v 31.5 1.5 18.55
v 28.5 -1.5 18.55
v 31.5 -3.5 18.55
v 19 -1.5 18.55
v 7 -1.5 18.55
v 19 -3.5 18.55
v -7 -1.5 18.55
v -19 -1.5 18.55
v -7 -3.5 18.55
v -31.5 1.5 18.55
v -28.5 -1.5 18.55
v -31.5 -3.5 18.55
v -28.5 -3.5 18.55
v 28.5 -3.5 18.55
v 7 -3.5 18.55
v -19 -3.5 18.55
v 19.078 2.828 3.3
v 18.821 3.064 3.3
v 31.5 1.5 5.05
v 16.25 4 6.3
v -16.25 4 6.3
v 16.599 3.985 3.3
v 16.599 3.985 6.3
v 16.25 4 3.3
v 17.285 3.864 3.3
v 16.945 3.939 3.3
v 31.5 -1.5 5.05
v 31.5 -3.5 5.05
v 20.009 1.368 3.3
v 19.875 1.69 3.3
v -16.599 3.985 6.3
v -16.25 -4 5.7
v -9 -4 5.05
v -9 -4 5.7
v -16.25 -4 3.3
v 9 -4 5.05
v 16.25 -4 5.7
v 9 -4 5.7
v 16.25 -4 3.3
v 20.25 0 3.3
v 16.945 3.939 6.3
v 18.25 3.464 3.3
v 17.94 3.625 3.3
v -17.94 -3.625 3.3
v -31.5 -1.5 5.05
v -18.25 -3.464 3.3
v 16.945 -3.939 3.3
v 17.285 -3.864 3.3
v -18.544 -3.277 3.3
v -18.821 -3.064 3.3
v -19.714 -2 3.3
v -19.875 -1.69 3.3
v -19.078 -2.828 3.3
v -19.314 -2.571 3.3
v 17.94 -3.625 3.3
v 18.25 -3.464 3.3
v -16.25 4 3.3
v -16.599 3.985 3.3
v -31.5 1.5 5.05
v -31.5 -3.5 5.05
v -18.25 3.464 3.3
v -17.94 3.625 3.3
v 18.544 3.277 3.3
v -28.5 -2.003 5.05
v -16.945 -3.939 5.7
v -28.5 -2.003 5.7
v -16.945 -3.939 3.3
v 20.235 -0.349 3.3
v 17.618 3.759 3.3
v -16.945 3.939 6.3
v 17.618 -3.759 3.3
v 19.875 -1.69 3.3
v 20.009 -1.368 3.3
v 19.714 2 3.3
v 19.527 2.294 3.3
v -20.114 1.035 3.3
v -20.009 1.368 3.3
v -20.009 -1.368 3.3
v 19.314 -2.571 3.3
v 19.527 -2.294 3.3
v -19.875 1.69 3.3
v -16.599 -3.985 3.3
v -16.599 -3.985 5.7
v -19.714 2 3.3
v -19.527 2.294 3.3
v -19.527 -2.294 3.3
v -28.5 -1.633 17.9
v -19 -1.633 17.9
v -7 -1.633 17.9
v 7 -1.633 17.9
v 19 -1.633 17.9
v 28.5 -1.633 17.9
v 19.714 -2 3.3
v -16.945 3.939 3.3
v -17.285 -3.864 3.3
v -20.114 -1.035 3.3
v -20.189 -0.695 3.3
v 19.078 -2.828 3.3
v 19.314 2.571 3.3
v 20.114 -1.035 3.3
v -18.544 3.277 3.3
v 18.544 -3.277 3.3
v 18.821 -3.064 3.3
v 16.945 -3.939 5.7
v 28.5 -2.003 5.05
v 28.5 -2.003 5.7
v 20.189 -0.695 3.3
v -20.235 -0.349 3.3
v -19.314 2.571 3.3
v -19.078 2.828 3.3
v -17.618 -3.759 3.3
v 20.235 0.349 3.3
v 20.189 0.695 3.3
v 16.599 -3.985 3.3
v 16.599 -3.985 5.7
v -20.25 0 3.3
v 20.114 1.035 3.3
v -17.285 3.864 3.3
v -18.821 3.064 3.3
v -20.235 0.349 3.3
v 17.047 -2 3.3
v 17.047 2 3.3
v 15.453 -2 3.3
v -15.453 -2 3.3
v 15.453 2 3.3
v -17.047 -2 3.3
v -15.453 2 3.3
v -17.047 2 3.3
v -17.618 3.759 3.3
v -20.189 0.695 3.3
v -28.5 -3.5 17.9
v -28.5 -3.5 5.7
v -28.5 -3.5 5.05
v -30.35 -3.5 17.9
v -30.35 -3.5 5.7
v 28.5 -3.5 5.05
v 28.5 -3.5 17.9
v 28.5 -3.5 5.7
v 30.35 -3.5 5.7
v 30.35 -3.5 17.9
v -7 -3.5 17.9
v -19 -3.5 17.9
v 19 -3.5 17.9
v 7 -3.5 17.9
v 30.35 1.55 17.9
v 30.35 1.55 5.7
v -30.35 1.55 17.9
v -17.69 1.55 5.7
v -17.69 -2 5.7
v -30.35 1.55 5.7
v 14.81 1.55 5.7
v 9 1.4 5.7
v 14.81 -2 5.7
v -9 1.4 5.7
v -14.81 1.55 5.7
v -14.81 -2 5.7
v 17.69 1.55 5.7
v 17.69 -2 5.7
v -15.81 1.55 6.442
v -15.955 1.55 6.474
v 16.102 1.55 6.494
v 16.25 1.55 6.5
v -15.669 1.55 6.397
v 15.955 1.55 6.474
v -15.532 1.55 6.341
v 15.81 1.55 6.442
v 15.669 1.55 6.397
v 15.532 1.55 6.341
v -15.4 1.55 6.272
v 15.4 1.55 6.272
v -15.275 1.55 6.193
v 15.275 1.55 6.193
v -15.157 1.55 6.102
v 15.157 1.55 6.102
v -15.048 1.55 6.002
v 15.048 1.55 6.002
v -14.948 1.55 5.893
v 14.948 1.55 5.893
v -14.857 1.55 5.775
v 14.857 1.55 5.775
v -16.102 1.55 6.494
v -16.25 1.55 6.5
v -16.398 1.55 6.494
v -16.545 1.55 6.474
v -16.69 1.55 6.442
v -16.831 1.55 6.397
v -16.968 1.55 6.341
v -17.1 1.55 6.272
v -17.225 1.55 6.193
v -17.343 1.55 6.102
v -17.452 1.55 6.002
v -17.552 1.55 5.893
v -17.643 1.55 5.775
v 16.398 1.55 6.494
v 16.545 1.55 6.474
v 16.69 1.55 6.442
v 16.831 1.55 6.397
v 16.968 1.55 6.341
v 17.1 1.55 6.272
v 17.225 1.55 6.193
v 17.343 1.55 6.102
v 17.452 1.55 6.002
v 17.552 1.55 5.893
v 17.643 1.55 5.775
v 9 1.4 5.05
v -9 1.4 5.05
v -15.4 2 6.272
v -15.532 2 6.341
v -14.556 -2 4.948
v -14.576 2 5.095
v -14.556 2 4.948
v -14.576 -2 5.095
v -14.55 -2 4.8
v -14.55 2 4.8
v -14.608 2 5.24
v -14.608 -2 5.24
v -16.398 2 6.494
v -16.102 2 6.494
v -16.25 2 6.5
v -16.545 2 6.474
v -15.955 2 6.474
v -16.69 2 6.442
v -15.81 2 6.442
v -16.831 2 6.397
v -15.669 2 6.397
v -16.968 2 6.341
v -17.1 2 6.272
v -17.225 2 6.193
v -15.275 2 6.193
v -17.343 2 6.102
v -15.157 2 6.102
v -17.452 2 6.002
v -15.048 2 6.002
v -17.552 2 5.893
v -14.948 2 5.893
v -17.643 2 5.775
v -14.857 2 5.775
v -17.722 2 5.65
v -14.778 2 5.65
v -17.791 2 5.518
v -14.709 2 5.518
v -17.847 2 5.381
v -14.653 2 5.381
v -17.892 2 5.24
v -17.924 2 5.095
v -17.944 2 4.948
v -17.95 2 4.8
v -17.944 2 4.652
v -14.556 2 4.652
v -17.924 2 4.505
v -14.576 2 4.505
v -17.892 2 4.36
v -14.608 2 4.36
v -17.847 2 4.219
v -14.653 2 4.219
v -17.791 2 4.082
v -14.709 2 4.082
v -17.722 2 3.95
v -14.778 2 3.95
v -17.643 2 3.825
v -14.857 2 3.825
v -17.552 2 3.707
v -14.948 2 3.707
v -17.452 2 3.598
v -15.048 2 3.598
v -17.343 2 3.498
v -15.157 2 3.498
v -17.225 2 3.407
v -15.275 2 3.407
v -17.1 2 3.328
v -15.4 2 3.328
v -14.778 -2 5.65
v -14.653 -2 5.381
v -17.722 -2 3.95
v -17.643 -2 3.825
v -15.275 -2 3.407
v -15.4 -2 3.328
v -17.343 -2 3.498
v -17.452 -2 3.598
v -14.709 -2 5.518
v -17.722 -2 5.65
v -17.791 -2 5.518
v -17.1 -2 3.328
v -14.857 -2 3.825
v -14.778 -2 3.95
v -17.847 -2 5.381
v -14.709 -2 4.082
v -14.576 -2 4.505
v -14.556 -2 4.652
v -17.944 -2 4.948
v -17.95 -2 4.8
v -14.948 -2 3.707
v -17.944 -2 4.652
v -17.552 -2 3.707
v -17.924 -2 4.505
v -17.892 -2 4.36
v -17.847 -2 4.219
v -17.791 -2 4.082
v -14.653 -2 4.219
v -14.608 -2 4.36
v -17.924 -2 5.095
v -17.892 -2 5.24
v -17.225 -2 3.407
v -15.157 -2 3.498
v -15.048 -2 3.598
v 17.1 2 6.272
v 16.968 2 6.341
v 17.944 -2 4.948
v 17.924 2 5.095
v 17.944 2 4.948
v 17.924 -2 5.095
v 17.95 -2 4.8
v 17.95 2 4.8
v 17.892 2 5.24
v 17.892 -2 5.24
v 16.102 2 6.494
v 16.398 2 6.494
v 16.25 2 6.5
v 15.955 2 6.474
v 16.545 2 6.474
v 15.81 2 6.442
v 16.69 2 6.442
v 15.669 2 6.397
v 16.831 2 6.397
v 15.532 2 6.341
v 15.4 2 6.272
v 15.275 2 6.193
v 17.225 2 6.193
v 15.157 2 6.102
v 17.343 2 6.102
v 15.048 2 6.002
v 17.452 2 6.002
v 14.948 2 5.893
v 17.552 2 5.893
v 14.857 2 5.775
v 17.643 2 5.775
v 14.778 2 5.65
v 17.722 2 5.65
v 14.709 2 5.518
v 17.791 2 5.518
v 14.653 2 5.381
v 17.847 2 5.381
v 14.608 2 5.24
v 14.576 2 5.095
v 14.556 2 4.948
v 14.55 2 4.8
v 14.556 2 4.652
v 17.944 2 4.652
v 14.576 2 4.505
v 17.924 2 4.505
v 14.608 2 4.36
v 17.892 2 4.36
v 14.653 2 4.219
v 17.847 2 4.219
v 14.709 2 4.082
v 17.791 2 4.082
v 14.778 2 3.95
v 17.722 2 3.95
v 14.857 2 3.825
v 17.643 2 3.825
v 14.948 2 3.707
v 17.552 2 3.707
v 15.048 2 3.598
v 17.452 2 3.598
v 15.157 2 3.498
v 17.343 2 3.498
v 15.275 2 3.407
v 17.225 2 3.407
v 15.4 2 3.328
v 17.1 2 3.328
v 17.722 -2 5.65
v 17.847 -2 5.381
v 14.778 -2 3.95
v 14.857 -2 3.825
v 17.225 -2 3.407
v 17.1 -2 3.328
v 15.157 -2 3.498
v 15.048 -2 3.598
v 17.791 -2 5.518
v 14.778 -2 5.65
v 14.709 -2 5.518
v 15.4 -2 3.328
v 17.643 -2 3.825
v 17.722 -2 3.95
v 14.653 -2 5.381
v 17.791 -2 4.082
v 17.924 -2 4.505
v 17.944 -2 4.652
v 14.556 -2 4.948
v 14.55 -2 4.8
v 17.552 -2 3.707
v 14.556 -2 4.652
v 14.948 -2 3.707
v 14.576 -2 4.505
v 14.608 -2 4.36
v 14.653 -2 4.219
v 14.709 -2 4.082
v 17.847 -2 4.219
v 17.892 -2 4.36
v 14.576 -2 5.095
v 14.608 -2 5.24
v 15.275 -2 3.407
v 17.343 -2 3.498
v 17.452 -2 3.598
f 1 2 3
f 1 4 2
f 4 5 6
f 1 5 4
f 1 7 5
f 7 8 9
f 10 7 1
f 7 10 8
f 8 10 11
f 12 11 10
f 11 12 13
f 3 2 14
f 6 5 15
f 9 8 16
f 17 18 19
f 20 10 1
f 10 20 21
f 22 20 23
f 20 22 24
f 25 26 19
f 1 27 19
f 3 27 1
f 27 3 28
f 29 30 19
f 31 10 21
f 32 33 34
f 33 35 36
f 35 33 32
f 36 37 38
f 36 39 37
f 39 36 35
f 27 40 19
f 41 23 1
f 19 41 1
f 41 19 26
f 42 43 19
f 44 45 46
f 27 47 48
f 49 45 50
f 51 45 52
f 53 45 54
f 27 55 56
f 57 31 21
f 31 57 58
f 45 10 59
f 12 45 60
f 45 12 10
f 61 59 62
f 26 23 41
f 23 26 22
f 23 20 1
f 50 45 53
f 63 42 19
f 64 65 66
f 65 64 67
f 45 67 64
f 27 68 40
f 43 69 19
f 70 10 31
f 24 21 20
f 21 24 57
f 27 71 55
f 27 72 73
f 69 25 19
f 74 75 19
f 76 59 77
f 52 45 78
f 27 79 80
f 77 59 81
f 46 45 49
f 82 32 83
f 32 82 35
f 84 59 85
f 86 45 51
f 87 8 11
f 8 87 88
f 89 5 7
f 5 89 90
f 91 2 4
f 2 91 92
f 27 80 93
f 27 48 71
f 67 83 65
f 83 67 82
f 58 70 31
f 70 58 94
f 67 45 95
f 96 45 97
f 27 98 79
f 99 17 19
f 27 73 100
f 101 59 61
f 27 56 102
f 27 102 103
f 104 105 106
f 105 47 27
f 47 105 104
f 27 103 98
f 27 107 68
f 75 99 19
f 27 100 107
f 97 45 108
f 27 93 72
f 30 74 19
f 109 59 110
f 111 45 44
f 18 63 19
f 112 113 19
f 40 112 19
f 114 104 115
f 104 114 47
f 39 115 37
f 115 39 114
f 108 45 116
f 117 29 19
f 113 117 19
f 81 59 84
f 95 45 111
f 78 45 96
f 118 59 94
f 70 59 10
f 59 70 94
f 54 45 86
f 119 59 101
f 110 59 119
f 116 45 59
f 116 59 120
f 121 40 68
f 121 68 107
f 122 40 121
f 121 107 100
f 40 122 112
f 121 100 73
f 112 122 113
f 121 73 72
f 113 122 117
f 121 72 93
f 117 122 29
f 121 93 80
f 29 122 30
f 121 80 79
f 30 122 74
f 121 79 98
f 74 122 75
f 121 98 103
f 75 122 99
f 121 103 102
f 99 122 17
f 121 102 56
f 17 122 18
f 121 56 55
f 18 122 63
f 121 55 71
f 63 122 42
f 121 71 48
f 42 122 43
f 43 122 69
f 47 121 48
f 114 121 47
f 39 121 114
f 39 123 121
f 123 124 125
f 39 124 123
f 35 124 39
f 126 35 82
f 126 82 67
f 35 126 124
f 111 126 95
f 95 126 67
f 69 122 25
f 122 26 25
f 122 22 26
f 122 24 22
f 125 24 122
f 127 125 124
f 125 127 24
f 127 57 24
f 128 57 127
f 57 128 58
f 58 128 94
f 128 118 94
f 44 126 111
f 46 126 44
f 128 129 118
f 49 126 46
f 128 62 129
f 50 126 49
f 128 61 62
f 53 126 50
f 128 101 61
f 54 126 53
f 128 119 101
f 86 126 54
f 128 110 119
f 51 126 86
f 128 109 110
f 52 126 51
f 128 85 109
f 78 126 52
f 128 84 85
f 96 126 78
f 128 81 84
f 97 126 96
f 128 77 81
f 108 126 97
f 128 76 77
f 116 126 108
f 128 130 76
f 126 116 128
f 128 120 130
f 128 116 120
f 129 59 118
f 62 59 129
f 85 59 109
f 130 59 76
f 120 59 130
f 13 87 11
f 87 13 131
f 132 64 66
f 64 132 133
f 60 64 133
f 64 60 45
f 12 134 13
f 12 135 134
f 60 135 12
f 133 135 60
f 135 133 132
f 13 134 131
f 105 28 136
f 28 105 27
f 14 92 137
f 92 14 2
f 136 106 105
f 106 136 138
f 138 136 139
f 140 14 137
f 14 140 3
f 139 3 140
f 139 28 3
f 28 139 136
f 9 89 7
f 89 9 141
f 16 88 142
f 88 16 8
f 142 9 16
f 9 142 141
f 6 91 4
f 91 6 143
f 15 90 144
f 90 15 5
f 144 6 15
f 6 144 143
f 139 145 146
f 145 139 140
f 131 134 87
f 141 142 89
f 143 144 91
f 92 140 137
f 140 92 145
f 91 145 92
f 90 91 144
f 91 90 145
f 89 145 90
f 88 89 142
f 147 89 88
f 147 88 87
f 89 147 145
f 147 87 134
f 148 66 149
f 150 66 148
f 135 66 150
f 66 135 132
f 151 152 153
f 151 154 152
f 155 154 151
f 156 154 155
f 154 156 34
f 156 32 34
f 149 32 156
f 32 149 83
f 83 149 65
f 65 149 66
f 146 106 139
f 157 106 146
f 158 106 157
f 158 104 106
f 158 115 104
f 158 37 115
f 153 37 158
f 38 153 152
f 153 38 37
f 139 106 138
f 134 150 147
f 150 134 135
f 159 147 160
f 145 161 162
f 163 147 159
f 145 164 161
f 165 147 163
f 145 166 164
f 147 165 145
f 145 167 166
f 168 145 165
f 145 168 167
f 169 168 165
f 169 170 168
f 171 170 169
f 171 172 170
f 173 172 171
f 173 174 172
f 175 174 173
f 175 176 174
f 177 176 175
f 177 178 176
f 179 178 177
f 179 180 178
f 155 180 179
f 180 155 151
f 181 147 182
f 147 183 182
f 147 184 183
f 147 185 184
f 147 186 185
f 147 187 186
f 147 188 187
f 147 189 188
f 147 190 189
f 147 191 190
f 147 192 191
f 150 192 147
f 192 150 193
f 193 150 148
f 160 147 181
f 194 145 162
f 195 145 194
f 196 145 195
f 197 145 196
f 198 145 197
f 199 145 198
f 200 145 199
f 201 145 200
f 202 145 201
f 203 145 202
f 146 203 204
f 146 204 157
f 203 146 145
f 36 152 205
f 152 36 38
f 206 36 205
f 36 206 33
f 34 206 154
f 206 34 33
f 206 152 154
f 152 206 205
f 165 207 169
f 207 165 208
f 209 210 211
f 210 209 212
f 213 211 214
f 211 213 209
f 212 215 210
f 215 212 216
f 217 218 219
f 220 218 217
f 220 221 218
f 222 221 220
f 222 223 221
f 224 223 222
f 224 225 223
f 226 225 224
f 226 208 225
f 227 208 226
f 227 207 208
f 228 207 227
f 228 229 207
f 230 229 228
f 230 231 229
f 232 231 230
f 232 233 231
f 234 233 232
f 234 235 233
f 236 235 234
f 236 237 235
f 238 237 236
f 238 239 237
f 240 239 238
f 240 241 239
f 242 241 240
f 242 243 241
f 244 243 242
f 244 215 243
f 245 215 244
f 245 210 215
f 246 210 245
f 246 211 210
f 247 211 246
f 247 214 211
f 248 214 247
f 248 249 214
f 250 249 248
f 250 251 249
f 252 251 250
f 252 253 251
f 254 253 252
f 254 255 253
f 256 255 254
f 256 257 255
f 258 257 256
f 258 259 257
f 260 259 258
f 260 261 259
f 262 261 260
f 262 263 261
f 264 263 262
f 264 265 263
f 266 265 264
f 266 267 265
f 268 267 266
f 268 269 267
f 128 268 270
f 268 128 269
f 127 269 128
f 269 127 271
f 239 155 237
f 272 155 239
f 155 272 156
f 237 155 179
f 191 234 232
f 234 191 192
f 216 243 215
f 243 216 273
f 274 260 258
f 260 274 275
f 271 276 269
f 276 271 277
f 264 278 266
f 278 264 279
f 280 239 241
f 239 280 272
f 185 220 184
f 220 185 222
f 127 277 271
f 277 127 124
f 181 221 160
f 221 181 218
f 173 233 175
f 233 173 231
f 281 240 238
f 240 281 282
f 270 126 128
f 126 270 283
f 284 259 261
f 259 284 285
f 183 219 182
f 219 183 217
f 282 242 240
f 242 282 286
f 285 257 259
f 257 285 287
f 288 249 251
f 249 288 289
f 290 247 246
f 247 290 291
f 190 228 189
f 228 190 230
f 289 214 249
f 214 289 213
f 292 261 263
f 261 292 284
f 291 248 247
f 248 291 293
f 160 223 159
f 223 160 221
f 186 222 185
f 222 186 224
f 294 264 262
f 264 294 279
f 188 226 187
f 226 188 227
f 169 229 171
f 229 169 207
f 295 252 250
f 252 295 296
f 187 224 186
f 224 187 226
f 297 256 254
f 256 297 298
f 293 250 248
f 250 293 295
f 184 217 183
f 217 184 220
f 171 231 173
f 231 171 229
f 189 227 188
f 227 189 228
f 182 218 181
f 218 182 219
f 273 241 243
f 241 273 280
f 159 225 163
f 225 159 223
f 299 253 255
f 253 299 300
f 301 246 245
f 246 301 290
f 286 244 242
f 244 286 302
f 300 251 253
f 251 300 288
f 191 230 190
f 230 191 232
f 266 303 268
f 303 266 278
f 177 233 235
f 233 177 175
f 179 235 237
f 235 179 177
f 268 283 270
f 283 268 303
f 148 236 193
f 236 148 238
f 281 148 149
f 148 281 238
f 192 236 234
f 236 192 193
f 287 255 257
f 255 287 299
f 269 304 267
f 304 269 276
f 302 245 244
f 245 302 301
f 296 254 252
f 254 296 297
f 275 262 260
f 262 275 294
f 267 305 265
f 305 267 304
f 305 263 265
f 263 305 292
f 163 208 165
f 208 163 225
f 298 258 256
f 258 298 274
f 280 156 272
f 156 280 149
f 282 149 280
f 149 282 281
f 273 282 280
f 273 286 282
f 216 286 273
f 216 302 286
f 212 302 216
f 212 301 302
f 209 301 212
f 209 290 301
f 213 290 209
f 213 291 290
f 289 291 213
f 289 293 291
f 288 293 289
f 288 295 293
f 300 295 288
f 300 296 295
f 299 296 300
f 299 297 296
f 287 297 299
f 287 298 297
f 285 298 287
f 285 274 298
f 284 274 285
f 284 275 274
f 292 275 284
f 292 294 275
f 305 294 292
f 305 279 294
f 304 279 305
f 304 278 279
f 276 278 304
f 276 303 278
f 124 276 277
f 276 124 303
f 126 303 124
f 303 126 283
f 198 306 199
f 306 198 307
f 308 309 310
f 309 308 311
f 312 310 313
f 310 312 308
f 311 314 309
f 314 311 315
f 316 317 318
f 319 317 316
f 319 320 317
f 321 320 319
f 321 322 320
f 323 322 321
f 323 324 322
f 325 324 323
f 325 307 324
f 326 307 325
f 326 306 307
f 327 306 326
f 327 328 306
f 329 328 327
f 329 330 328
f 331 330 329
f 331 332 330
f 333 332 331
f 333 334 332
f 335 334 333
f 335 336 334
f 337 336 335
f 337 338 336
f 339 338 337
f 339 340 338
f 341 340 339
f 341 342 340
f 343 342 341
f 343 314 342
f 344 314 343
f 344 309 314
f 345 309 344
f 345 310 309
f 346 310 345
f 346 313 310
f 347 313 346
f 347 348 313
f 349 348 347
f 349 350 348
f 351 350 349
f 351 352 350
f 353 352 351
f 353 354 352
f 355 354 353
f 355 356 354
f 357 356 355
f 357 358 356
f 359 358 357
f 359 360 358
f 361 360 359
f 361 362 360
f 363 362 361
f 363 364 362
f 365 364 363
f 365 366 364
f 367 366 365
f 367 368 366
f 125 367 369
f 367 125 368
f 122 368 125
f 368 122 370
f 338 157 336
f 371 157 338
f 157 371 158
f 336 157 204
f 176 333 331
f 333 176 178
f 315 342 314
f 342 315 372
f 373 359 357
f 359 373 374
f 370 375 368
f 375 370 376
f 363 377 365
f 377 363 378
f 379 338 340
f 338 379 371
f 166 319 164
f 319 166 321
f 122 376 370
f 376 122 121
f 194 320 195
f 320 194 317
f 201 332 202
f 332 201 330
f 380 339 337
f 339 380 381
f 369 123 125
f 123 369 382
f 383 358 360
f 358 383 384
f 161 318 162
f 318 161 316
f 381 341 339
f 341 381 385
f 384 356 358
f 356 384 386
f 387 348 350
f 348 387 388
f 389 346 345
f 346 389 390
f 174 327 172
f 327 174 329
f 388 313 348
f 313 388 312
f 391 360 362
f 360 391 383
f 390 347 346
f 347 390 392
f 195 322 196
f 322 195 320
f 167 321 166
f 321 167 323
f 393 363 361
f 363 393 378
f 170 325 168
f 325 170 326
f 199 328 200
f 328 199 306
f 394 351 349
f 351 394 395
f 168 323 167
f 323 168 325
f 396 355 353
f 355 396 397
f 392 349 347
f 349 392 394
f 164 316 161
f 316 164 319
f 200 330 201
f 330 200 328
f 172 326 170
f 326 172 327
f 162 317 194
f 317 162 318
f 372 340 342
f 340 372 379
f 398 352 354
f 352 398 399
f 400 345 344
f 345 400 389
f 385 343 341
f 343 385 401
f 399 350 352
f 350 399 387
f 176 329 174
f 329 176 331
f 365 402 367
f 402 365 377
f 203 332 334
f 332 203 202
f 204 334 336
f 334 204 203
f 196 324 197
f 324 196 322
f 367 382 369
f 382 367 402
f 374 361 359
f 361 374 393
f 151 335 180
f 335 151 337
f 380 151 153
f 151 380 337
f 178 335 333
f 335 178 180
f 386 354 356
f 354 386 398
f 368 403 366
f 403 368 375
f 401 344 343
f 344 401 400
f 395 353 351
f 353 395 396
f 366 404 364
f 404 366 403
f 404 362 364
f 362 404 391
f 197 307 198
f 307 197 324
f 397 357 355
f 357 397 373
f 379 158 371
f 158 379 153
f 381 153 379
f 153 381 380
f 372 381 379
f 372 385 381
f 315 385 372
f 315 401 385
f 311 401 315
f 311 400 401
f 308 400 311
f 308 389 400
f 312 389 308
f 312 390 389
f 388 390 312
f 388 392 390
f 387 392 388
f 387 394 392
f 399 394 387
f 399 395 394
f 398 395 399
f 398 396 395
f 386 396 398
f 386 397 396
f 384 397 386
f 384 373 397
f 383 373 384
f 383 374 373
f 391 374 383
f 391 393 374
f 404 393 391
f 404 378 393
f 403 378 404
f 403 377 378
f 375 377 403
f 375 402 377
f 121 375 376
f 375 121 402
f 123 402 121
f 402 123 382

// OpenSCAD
/*
  Arducam Pi Zero camera holder for a 5-inch FPV drone frame

  First-pass assumptions:
  - Drone frame mounting holes are M3, 32.5 mm center-to-center.
  - The frame-connecting face is no taller than 25 mm.
  - Camera is the skinny Arducam Raspberry Pi Zero style module,
    approximately 60 x 11.5 x 5.5 mm.

  Units: millimeters.
*/

$fn = 72;

frame_hole_spacing = 32.5;
frame_hole_diameter = 3.4;       // clearance for M3 bolts
frame_connector_height = 25;

camera_body_width = 60.0;
camera_body_height = 11.5;
camera_body_depth = 5.5;
camera_clearance = 0.7;

cradle_width = camera_body_width + 3.0;
cradle_height = camera_body_height + 2.0;
back_plate_thickness = 3.0;
front_lip_depth = 2.0;
front_lip_width = 3.0;

ear_diameter = 8.0;
ear_center_z = 4.8;

lens_opening_diameter = 9.0;
lens_x_offset = 0;               // tune if your Arducam lens is offset
lens_center_z = ear_center_z + 7.0;

cable_slot_width = 18.0;
cable_slot_height = 4.5;

module through_hole(x, z, diameter) {
  translate([x, 0, z])
    rotate([90, 0, 0])
      cylinder(h = back_plate_thickness + 1.0, d = diameter, center = true);
}

module front_cutout(width, height, depth, x, z) {
  translate([x, -back_plate_thickness / 2 - 0.01, z])
    cube([width, depth + 0.02, height], center = true);
}

module front_lip(x, z, w, h) {
  translate([x, -back_plate_thickness / 2 - front_lip_depth / 2, z])
    cube([w, front_lip_depth, h], center = true);
}

module fpv_zero_camera_profile() {
  hull() {
    // M3 standoff ears, matching common front hardware on 5-inch frames.
    for (x = [-frame_hole_spacing / 2, frame_hole_spacing / 2])
      translate([x, 0, ear_center_z])
        cylinder(h = back_plate_thickness, d = ear_diameter, center = true);

    // Long, low cradle for the Arducam Zero flex-board camera.
    translate([0, 0, lens_center_z])
      cube([cradle_width, back_plate_thickness, cradle_height], center = true);
  }
}

difference() {
  union() {
    fpv_zero_camera_profile();

    // Small lips retain the skinny camera module while leaving the lens,
    // ribbon/flex, and most of the front face open.
    front_lip(-cradle_width / 2 + front_lip_width / 2,
              lens_center_z, front_lip_width, cradle_height);
    front_lip(cradle_width / 2 - front_lip_width / 2,
              lens_center_z, front_lip_width, cradle_height);
    front_lip(-13.0, lens_center_z + cradle_height / 2 - 1.0,
              12.0, 2.0);
    front_lip(13.0, lens_center_z + cradle_height / 2 - 1.0,
              12.0, 2.0);
    front_lip(-13.0, lens_center_z - cradle_height / 2 + 1.0,
              12.0, 2.0);
    front_lip(13.0, lens_center_z - cradle_height / 2 + 1.0,
              12.0, 2.0);
  }

  // Camera module pocket.
  front_cutout(camera_body_width + camera_clearance,
               camera_body_height + camera_clearance,
               camera_body_depth + 0.6,
               0, lens_center_z);

  // Lens opening.
  translate([lens_x_offset, -back_plate_thickness / 2 - 0.02, lens_center_z])
    rotate([90, 0, 0])
      cylinder(h = back_plate_thickness + front_lip_depth + 0.9,
               d = lens_opening_diameter, center = true);

  // Cable/flex relief through the lower middle.
  front_cutout(cable_slot_width, cable_slot_height,
               back_plate_thickness + front_lip_depth + 0.8,
               0, lens_center_z - cradle_height / 2 + cable_slot_height / 2);

  // Drone frame M3 mounting holes, exactly 32.5 mm apart.
  through_hole(-frame_hole_spacing / 2, ear_center_z, frame_hole_diameter);
  through_hole(frame_hole_spacing / 2, ear_center_z, frame_hole_diameter);
}
